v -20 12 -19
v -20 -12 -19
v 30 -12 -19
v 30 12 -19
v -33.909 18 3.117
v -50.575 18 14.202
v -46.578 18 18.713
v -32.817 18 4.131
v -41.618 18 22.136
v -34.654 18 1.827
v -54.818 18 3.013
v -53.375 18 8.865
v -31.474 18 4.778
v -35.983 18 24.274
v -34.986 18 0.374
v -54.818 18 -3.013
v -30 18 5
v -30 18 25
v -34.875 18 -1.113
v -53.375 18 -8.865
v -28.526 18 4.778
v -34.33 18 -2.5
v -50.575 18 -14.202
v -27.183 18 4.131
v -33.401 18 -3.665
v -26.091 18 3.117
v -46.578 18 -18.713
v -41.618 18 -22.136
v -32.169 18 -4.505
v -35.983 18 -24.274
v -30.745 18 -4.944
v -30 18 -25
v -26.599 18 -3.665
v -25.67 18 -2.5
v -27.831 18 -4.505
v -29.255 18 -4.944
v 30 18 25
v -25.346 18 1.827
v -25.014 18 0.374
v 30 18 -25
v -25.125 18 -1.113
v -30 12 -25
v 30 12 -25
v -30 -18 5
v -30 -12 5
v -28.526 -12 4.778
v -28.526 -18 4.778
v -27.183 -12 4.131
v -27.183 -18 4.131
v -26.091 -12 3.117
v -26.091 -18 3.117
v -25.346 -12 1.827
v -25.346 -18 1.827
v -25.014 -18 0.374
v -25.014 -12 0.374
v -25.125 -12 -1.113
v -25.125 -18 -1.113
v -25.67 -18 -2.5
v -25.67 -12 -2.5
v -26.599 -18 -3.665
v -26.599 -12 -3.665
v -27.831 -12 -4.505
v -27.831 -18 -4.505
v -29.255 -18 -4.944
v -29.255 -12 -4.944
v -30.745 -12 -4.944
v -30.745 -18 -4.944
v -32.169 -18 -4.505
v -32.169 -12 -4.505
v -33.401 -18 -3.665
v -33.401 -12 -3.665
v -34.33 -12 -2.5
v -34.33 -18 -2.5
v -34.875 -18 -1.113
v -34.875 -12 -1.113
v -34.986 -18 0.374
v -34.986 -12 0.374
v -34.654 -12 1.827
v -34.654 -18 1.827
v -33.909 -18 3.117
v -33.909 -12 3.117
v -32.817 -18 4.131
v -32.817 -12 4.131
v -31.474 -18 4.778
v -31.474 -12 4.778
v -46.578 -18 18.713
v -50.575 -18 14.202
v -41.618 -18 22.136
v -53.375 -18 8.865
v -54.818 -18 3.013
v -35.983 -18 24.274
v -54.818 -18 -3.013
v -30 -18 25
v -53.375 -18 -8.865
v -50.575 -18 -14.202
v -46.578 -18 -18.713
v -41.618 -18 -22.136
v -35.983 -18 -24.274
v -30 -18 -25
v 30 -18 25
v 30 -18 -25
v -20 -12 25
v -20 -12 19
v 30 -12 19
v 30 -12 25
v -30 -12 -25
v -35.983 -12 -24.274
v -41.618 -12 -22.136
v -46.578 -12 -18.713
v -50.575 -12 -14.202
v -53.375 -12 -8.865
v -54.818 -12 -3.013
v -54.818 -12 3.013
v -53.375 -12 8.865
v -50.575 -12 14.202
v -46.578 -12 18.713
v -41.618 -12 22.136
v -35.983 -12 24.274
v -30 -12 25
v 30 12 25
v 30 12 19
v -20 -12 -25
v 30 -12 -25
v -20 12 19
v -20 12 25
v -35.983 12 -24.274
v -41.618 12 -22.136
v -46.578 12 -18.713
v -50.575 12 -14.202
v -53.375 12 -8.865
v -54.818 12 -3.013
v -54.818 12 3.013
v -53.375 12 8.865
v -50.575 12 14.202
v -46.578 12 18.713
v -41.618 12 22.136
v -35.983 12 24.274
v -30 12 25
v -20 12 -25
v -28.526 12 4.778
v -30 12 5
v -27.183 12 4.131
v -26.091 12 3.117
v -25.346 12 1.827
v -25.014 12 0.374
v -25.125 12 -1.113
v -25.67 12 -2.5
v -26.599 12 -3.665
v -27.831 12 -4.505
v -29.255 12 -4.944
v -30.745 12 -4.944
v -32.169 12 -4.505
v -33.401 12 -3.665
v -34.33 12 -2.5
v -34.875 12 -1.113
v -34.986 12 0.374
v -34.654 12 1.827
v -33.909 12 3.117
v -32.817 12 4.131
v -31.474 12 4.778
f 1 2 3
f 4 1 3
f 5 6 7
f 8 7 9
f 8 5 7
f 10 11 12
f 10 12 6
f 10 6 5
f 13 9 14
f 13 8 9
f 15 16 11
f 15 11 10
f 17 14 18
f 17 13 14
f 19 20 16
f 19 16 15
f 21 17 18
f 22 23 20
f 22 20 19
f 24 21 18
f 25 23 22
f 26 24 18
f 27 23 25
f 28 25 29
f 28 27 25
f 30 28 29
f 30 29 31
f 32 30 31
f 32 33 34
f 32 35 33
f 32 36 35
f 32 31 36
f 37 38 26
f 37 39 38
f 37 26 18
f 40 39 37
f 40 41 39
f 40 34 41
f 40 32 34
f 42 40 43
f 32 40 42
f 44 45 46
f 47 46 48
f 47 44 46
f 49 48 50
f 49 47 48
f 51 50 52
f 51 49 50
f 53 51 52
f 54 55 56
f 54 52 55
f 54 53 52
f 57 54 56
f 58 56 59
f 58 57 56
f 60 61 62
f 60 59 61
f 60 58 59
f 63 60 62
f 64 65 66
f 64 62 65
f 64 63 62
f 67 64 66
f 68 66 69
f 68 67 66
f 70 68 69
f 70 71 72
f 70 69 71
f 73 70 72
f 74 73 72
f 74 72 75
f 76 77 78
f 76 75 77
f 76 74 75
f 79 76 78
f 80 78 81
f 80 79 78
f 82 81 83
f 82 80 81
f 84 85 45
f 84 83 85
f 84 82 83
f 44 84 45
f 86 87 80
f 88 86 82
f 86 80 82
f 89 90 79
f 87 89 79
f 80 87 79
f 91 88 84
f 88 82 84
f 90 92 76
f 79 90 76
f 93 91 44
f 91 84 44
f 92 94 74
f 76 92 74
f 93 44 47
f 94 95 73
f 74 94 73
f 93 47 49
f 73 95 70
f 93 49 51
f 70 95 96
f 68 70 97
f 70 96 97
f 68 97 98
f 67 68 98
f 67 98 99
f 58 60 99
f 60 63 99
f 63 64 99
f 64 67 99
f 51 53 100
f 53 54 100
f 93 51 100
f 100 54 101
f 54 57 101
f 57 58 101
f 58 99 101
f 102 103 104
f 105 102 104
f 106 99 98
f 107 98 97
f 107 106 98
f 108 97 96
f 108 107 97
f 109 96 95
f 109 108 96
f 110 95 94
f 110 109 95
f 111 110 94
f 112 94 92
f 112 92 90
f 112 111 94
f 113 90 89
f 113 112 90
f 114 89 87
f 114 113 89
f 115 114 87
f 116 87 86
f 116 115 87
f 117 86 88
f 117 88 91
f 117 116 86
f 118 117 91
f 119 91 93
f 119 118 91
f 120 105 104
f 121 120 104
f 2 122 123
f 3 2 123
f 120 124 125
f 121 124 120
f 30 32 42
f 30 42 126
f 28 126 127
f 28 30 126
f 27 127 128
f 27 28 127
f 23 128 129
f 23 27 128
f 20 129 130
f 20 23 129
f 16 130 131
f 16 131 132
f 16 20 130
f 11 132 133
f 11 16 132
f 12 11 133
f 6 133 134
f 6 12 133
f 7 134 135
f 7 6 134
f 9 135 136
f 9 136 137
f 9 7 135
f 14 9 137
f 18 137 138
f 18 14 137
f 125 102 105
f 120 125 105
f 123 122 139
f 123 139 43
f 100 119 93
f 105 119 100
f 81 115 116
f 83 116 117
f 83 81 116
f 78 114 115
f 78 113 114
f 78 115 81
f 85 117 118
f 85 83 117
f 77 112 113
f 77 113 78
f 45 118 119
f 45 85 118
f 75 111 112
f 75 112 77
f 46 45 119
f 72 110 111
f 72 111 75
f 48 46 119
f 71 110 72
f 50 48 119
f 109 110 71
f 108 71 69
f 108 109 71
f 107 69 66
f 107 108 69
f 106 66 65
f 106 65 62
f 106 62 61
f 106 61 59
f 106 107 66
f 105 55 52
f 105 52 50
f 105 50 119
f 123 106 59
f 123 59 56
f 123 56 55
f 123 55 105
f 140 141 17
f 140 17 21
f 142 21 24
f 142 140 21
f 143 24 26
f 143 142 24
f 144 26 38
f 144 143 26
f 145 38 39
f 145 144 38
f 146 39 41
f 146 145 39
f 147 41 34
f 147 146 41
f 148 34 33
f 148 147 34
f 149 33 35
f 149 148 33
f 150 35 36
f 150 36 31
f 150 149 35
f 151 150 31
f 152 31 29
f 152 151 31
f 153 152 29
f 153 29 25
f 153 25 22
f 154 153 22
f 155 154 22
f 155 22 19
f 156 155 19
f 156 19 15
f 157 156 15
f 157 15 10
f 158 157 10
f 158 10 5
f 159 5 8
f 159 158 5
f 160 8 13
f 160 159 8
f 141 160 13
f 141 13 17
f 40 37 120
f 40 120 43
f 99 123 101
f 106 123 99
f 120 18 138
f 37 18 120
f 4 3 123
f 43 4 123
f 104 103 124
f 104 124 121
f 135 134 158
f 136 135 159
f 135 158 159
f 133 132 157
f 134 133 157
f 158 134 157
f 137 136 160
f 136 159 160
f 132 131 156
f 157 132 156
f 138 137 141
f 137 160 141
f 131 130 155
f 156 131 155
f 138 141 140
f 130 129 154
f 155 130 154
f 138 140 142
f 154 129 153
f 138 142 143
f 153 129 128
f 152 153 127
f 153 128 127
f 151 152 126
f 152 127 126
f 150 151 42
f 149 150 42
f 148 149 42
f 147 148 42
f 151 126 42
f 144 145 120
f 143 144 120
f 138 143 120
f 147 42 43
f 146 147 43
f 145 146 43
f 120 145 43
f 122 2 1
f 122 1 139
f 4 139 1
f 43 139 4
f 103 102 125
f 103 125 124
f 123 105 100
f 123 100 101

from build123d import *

# Parameters (mm, degrees)
SKETCH1_R               = 5
BOSS_EXTRUDE1_DEPTH     = 18
CUT_EXTRUDE1_DEPTH      = 64.03967005
CUT_EXTRUDE1_DEPTH_BACK = 64.03967005
SKETCH2_W               = 85
SKETCH2_H               = 24
BOSS_EXTRUDE2_REACH     = 69.454
SKETCH3_W               = 50
SKETCH3_H               = 6


with BuildPart() as part:
    # Sketch1 → Boss-Extrude1 (new, symmetric)
    with BuildSketch(Plane(origin=(0, 0, 0), x_dir=(1, 0, 0), z_dir=(0, 1, 0))):
        with BuildLine():
            Line((-30, -25), (30, -25))
            Line((30, -25), (30, 25))
            Line((30, 25), (-30, 25))
            ThreePointArc((-30, 25), (-55, 0), (-30, -25))
        make_face()
        with Locations(Location((-30, 0, 0), (0, 0, 270))):
            Circle(SKETCH1_R, mode=Mode.SUBTRACT)
    extrude(amount=BOSS_EXTRUDE1_DEPTH, both=True)

    # Sketch2 → Cut-Extrude1 (cut, two sides: drawn at the far end of the back side and taken through both)
    with BuildSketch(Plane.XY.offset(-CUT_EXTRUDE1_DEPTH_BACK)):
        with Locations((-12.5, 0)):
            Rectangle(SKETCH2_W, SKETCH2_H)
    extrude(amount=CUT_EXTRUDE1_DEPTH + CUT_EXTRUDE1_DEPTH_BACK, mode=Mode.SUBTRACT)


with BuildPart() as cut_extrude1_piece_1:
    # of the separate pieces the step leaves, piece 1, a body of its own (cut_extrude1_pieces)
    add(part.part.solids().sort_by_distance((-30, -12, 25))[0])


with BuildPart() as cut_extrude1_piece_2:
    # of the separate pieces the step leaves, piece 2, a body of its own (cut_extrude1_pieces)
    add(part.part.solids().sort_by_distance((-30, 18, 25))[0])


with BuildPart() as body_3:

    # Sketch3 → Boss-Extrude2 (new, up to next)
    with BuildSketch(Plane(origin=(0, -12, 0), x_dir=(1, 0, 0), z_dir=(0, 1, 0)), mode=Mode.PRIVATE) as boss_extrude2_sk1:
        with Locations((5, 22)):
            Rectangle(SKETCH3_W, SKETCH3_H)
    boss_extrude2_tool1 = extrude(boss_extrude2_sk1.sketch, amount=BOSS_EXTRUDE2_REACH, mode=Mode.PRIVATE) - cut_extrude1_piece_2.part
    # Sketch3 → Boss-Extrude2 (new, up to next)
    with BuildSketch(Plane(origin=(0, -12, 0), x_dir=(1, 0, 0), z_dir=(0, 1, 0)), mode=Mode.PRIVATE) as boss_extrude2_sk2:
        with Locations((5, -22)):
            Rectangle(SKETCH3_W, SKETCH3_H)
    boss_extrude2_tool2 = extrude(boss_extrude2_sk2.sketch, amount=BOSS_EXTRUDE2_REACH, mode=Mode.PRIVATE) - cut_extrude1_piece_2.part
    add(boss_extrude2_tool1.solids().sort_by_distance((5, -12, -22))[0])
    add(boss_extrude2_tool2.solids().sort_by_distance((5, -12, 22))[0])


solid = Compound([cut_extrude1_piece_1.part, cut_extrude1_piece_2.part, body_3.part])
